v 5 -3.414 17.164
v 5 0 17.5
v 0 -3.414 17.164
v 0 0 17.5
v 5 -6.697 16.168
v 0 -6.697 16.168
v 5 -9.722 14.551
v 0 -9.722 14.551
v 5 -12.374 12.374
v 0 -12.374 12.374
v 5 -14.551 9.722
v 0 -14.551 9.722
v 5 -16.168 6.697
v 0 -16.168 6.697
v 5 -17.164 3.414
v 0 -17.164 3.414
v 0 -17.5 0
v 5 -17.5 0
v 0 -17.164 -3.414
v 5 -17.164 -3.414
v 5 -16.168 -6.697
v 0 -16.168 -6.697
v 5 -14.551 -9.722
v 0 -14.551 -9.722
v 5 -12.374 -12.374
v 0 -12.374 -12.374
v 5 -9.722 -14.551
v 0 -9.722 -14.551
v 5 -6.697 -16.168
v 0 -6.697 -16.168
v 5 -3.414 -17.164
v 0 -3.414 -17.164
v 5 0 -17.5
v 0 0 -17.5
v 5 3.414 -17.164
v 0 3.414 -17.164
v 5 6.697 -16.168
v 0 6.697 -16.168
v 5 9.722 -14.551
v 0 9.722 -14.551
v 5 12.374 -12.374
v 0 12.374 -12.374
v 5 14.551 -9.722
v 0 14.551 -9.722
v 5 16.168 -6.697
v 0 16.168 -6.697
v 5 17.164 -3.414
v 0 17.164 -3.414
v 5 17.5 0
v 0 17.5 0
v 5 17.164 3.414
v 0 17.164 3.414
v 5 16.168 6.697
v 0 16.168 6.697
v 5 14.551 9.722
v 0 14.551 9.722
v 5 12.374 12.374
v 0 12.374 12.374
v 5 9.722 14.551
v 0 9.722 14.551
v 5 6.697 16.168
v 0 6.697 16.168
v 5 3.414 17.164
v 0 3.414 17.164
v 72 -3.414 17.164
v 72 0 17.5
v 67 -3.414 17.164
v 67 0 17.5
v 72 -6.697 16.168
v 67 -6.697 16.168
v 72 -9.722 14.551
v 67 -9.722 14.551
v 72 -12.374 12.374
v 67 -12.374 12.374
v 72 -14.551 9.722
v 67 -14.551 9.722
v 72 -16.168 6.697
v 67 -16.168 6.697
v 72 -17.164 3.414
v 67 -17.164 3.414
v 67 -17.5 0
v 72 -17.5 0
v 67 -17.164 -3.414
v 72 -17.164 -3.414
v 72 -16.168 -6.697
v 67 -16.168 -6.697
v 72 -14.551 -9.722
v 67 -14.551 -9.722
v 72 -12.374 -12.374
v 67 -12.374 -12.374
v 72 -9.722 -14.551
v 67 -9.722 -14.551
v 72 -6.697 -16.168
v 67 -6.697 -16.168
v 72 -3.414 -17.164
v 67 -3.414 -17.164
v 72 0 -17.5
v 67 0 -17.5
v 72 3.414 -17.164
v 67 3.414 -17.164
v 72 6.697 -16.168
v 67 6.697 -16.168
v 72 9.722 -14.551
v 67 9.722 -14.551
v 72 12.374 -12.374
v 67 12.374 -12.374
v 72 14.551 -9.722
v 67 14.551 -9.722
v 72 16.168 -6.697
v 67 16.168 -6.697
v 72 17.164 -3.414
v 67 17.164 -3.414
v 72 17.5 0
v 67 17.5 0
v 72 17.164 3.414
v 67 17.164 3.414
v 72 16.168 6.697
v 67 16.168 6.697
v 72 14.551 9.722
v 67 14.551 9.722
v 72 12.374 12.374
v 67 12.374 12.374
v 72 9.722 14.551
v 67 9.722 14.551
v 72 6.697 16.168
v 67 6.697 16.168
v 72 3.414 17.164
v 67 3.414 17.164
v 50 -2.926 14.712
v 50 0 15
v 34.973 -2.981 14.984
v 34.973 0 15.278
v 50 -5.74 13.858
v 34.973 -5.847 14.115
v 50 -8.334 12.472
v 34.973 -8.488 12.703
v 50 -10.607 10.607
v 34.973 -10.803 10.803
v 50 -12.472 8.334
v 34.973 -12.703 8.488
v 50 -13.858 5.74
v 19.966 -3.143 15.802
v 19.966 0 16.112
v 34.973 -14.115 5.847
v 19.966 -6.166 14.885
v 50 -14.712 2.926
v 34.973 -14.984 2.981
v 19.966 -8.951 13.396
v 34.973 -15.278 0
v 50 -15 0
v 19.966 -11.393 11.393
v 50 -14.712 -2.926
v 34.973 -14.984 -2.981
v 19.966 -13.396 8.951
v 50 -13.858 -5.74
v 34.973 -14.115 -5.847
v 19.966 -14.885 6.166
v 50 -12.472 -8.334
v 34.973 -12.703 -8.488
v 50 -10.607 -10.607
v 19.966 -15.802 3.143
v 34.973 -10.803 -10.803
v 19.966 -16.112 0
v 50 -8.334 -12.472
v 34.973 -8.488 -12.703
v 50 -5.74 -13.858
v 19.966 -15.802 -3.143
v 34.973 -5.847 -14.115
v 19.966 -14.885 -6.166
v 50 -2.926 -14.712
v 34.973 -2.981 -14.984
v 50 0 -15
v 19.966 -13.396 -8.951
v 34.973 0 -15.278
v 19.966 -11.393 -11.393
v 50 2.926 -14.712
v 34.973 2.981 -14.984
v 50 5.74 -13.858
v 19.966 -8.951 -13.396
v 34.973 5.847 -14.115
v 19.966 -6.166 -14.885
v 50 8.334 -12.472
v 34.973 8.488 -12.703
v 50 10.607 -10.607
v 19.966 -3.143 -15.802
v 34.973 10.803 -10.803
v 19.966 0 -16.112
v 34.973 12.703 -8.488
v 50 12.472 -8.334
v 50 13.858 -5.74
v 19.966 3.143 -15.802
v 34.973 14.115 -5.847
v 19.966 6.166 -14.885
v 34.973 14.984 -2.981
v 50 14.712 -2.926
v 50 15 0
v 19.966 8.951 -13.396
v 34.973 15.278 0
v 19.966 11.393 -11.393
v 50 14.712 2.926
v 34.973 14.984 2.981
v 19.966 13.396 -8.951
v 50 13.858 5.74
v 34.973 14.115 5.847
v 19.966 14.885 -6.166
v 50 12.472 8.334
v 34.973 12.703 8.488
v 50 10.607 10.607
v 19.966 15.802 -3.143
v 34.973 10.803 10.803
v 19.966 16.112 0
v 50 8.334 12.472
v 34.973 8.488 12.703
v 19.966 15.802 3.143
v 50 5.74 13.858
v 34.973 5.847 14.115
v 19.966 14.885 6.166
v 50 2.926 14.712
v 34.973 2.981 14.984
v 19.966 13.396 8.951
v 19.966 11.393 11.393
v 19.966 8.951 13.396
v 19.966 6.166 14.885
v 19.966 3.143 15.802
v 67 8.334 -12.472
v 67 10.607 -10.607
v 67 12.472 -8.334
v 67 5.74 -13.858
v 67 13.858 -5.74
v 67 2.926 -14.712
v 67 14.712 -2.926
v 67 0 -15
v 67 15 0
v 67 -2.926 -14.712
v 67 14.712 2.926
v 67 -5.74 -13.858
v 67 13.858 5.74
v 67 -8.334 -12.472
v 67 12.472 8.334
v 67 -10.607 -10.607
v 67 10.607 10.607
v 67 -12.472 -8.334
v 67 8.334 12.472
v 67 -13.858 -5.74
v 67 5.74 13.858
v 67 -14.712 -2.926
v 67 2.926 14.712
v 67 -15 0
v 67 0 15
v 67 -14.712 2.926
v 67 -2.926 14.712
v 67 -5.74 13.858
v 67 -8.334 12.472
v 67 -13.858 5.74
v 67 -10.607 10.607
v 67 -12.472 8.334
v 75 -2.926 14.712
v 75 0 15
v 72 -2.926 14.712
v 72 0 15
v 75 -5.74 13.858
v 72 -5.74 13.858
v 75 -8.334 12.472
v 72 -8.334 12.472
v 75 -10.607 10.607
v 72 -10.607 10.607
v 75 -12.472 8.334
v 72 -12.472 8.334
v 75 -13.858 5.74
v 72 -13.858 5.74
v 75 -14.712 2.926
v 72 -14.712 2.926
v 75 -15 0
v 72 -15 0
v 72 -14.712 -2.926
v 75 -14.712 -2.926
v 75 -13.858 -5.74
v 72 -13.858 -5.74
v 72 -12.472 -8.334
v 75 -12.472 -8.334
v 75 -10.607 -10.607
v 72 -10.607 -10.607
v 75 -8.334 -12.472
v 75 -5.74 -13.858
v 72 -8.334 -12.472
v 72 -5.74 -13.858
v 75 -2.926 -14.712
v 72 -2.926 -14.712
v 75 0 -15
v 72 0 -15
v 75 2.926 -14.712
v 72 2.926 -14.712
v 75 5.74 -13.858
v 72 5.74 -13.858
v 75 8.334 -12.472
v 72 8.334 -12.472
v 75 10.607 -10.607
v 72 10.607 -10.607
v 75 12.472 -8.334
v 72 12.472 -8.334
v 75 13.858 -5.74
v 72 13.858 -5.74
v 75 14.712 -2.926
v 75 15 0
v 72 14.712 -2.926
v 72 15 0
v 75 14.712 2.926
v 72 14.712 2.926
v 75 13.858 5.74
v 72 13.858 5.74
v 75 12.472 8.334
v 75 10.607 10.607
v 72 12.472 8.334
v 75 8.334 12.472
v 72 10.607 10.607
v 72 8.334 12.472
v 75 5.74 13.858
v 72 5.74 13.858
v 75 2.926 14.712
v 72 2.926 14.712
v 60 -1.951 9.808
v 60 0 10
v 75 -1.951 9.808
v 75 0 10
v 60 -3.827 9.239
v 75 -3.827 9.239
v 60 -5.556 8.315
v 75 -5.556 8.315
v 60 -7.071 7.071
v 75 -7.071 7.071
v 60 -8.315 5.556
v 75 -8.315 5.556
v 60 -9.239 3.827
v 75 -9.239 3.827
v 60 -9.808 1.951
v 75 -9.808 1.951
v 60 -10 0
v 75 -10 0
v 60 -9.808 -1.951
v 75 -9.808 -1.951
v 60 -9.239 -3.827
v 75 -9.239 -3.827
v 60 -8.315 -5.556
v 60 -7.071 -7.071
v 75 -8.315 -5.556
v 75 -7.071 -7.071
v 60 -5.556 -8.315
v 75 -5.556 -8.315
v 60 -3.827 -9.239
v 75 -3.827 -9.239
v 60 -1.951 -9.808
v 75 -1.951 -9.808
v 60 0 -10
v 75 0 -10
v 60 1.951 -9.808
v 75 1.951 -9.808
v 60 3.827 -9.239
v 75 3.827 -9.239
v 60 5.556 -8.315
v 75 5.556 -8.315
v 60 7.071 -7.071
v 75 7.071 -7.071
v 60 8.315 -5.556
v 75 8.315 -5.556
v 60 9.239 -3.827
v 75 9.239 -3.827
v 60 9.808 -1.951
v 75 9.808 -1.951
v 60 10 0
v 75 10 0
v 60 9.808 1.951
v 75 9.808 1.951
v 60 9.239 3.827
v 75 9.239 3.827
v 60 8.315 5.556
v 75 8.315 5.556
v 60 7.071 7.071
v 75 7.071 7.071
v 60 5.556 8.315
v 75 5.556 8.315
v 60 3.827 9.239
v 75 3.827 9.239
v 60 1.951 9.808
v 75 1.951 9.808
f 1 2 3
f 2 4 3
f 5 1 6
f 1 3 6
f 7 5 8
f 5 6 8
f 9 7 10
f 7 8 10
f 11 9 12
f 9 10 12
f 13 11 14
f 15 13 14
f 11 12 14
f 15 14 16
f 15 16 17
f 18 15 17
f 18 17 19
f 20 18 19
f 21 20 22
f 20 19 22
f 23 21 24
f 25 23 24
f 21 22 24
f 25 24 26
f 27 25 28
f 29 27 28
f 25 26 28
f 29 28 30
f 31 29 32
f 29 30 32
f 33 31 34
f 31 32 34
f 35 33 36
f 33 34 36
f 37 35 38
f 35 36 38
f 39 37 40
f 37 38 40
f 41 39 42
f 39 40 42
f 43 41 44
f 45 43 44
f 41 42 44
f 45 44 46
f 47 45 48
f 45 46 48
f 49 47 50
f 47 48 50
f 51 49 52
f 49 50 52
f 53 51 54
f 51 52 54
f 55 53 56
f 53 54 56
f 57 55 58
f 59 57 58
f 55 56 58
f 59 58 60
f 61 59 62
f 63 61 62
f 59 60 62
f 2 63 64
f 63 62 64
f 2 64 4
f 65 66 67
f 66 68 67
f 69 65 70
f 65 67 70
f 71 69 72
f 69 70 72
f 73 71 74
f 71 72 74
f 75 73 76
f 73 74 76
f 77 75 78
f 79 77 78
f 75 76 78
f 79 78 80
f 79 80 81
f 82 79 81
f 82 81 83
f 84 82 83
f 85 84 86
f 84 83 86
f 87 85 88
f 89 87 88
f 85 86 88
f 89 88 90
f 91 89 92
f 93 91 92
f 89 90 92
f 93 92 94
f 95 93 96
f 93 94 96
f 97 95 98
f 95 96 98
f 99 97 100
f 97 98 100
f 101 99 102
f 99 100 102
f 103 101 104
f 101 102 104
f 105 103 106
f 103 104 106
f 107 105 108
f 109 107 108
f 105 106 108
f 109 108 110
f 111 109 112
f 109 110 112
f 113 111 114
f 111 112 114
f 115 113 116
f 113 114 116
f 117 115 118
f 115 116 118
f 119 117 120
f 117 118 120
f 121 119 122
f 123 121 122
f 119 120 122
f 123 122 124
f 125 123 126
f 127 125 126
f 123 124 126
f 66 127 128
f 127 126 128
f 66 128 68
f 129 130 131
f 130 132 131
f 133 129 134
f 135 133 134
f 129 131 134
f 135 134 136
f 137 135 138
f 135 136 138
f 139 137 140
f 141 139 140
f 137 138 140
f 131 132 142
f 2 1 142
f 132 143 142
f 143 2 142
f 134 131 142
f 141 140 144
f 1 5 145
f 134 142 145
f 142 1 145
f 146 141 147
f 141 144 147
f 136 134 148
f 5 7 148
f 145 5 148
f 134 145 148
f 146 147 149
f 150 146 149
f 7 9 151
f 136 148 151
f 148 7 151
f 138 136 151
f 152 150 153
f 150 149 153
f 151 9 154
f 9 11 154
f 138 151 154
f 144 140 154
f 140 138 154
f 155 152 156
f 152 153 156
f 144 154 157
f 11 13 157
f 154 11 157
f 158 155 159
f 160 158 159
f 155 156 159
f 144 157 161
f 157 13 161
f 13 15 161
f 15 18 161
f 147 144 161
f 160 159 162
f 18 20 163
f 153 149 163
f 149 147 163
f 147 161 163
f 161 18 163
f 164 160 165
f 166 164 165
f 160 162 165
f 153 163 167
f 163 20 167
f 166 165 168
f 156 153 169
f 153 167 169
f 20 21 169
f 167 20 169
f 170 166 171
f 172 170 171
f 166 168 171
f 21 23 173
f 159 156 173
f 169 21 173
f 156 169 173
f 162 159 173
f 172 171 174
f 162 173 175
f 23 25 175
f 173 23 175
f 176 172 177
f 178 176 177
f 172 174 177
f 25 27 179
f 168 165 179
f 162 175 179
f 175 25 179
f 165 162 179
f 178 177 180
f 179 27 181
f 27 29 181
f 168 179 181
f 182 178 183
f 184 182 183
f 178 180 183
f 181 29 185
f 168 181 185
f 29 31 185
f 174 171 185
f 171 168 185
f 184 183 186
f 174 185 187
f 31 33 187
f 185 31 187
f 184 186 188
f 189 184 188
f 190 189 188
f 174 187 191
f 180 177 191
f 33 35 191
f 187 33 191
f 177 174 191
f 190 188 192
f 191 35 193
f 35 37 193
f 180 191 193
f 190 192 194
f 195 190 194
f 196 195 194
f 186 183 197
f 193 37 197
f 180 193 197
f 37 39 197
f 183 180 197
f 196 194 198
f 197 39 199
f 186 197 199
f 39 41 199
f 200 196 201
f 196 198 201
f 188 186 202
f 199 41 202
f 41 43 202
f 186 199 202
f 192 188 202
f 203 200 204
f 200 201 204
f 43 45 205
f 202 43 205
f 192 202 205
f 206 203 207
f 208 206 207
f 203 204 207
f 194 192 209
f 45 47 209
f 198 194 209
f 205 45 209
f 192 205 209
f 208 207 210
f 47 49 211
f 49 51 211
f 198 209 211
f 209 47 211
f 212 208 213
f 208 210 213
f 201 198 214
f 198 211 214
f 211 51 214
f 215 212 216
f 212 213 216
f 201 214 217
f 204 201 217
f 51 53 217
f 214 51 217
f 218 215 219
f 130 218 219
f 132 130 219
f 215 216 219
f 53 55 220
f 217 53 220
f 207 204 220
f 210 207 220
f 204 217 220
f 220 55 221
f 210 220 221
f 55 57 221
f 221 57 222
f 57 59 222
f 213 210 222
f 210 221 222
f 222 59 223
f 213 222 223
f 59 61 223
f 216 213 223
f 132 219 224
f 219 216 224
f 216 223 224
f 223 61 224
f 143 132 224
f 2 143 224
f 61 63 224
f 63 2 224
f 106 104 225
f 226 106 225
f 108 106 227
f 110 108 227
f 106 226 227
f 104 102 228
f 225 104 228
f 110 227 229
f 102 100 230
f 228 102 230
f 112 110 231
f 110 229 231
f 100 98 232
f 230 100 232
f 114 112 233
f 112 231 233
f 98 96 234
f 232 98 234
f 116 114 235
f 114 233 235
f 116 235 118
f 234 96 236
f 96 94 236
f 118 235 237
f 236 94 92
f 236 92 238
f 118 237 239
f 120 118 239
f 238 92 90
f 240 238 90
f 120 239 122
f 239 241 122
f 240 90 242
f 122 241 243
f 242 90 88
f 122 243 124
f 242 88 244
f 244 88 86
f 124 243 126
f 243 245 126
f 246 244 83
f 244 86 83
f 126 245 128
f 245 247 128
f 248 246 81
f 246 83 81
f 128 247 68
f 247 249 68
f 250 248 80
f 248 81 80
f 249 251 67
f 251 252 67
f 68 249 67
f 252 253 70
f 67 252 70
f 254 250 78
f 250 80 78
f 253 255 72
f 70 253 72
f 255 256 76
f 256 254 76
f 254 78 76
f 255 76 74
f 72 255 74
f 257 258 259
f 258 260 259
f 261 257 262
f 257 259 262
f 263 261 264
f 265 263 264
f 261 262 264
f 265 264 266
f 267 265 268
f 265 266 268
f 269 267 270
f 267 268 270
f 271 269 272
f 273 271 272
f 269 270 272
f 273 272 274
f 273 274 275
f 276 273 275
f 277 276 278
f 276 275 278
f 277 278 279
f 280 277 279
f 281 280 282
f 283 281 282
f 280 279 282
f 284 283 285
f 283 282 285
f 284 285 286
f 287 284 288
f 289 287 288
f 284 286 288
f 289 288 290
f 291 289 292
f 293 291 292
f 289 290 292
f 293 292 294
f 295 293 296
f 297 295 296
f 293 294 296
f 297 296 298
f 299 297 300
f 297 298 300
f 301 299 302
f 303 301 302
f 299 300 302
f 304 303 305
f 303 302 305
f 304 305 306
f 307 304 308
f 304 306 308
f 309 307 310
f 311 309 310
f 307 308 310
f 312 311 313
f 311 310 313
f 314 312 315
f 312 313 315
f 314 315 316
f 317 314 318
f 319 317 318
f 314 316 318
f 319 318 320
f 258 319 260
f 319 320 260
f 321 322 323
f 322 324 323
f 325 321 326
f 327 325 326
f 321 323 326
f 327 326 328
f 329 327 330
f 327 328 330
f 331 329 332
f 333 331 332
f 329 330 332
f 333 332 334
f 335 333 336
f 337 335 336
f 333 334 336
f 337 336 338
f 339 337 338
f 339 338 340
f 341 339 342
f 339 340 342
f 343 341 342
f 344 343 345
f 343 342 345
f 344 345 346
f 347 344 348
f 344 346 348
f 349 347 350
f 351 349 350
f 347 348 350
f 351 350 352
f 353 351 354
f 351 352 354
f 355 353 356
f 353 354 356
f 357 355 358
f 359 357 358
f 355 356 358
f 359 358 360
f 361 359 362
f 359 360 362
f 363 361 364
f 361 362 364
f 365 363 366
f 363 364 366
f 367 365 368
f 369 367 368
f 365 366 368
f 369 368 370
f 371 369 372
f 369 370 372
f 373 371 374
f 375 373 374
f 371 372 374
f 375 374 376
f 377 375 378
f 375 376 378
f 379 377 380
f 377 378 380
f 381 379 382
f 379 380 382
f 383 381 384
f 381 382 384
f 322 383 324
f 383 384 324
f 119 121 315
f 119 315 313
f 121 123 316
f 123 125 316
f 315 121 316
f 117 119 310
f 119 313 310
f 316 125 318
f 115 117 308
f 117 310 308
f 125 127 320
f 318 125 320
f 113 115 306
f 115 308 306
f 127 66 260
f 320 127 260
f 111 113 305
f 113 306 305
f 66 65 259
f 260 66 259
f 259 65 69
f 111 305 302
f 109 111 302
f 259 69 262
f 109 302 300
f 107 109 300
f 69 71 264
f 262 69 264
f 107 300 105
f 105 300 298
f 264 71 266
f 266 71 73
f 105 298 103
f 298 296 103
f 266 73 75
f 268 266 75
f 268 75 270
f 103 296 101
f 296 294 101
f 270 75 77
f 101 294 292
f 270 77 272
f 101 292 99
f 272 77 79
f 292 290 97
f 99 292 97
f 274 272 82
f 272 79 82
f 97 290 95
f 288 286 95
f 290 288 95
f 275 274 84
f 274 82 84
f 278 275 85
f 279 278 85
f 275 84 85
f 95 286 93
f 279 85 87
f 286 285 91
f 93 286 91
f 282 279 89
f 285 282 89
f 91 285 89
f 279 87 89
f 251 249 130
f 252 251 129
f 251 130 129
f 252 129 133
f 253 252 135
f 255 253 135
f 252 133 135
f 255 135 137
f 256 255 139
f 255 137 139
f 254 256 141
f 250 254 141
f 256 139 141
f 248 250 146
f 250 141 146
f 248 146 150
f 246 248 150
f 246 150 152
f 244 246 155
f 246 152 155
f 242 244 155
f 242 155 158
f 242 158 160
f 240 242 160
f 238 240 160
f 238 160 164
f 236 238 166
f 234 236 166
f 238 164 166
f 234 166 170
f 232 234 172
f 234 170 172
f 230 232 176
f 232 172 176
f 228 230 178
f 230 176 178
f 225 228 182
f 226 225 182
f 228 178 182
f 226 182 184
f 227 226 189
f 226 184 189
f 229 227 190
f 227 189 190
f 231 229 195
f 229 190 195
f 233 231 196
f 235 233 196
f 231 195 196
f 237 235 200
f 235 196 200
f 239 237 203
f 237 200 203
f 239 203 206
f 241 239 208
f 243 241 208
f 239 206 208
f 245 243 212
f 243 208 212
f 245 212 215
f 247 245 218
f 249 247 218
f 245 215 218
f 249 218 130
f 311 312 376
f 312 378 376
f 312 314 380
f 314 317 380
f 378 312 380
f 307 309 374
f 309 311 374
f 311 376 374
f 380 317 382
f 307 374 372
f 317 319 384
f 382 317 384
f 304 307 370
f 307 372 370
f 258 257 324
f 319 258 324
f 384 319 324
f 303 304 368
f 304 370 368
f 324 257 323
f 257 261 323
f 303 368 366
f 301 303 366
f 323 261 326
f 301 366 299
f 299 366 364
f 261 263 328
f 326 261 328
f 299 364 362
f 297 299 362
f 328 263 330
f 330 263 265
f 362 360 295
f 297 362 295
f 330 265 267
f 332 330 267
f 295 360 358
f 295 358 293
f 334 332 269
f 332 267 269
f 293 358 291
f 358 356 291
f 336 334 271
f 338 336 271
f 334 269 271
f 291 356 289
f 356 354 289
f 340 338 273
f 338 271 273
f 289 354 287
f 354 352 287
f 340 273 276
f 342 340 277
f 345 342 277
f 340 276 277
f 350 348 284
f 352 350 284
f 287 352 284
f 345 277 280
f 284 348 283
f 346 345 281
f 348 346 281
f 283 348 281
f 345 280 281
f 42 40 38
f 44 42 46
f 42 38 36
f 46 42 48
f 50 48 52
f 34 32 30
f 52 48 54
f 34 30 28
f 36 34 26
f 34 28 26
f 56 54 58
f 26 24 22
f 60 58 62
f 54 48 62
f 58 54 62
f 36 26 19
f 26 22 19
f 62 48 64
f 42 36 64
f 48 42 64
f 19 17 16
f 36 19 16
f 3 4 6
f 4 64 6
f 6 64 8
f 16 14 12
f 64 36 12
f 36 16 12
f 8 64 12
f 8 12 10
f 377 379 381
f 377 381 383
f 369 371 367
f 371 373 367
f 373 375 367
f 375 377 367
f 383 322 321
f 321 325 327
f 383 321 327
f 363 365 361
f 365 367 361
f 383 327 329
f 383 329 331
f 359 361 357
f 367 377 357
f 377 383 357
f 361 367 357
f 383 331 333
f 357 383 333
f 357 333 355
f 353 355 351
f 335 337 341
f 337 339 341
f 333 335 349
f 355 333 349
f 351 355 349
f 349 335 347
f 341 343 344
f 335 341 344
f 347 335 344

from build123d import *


with BuildPart() as f1:
    # F0 (on Front) → F1 (revolve)
    with BuildSketch(Plane.XZ):
        with BuildLine():
            Line((0, 17.5), (0, 0))
            Line((0, 0), (60, 0))
            Line((60, 0), (60, 10))
            Line((60, 10), (75, 10))
            Line((75, 10), (75, 15))
            Line((75, 15), (72, 15))
            Line((72, 15), (72, 17.5))
            Line((72, 17.5), (67, 17.5))
            Line((67, 17.5), (67, 15))
            Line((67, 15), (50, 15))
            ThreePointArc((50, 15), (27.465305, 15.625482), (5, 17.5))
            Line((5, 17.5), (0, 17.5))
        make_face()
    revolve(axis=Axis((30, 0, 0), (1, 0, 0)))


solid = f1.part
